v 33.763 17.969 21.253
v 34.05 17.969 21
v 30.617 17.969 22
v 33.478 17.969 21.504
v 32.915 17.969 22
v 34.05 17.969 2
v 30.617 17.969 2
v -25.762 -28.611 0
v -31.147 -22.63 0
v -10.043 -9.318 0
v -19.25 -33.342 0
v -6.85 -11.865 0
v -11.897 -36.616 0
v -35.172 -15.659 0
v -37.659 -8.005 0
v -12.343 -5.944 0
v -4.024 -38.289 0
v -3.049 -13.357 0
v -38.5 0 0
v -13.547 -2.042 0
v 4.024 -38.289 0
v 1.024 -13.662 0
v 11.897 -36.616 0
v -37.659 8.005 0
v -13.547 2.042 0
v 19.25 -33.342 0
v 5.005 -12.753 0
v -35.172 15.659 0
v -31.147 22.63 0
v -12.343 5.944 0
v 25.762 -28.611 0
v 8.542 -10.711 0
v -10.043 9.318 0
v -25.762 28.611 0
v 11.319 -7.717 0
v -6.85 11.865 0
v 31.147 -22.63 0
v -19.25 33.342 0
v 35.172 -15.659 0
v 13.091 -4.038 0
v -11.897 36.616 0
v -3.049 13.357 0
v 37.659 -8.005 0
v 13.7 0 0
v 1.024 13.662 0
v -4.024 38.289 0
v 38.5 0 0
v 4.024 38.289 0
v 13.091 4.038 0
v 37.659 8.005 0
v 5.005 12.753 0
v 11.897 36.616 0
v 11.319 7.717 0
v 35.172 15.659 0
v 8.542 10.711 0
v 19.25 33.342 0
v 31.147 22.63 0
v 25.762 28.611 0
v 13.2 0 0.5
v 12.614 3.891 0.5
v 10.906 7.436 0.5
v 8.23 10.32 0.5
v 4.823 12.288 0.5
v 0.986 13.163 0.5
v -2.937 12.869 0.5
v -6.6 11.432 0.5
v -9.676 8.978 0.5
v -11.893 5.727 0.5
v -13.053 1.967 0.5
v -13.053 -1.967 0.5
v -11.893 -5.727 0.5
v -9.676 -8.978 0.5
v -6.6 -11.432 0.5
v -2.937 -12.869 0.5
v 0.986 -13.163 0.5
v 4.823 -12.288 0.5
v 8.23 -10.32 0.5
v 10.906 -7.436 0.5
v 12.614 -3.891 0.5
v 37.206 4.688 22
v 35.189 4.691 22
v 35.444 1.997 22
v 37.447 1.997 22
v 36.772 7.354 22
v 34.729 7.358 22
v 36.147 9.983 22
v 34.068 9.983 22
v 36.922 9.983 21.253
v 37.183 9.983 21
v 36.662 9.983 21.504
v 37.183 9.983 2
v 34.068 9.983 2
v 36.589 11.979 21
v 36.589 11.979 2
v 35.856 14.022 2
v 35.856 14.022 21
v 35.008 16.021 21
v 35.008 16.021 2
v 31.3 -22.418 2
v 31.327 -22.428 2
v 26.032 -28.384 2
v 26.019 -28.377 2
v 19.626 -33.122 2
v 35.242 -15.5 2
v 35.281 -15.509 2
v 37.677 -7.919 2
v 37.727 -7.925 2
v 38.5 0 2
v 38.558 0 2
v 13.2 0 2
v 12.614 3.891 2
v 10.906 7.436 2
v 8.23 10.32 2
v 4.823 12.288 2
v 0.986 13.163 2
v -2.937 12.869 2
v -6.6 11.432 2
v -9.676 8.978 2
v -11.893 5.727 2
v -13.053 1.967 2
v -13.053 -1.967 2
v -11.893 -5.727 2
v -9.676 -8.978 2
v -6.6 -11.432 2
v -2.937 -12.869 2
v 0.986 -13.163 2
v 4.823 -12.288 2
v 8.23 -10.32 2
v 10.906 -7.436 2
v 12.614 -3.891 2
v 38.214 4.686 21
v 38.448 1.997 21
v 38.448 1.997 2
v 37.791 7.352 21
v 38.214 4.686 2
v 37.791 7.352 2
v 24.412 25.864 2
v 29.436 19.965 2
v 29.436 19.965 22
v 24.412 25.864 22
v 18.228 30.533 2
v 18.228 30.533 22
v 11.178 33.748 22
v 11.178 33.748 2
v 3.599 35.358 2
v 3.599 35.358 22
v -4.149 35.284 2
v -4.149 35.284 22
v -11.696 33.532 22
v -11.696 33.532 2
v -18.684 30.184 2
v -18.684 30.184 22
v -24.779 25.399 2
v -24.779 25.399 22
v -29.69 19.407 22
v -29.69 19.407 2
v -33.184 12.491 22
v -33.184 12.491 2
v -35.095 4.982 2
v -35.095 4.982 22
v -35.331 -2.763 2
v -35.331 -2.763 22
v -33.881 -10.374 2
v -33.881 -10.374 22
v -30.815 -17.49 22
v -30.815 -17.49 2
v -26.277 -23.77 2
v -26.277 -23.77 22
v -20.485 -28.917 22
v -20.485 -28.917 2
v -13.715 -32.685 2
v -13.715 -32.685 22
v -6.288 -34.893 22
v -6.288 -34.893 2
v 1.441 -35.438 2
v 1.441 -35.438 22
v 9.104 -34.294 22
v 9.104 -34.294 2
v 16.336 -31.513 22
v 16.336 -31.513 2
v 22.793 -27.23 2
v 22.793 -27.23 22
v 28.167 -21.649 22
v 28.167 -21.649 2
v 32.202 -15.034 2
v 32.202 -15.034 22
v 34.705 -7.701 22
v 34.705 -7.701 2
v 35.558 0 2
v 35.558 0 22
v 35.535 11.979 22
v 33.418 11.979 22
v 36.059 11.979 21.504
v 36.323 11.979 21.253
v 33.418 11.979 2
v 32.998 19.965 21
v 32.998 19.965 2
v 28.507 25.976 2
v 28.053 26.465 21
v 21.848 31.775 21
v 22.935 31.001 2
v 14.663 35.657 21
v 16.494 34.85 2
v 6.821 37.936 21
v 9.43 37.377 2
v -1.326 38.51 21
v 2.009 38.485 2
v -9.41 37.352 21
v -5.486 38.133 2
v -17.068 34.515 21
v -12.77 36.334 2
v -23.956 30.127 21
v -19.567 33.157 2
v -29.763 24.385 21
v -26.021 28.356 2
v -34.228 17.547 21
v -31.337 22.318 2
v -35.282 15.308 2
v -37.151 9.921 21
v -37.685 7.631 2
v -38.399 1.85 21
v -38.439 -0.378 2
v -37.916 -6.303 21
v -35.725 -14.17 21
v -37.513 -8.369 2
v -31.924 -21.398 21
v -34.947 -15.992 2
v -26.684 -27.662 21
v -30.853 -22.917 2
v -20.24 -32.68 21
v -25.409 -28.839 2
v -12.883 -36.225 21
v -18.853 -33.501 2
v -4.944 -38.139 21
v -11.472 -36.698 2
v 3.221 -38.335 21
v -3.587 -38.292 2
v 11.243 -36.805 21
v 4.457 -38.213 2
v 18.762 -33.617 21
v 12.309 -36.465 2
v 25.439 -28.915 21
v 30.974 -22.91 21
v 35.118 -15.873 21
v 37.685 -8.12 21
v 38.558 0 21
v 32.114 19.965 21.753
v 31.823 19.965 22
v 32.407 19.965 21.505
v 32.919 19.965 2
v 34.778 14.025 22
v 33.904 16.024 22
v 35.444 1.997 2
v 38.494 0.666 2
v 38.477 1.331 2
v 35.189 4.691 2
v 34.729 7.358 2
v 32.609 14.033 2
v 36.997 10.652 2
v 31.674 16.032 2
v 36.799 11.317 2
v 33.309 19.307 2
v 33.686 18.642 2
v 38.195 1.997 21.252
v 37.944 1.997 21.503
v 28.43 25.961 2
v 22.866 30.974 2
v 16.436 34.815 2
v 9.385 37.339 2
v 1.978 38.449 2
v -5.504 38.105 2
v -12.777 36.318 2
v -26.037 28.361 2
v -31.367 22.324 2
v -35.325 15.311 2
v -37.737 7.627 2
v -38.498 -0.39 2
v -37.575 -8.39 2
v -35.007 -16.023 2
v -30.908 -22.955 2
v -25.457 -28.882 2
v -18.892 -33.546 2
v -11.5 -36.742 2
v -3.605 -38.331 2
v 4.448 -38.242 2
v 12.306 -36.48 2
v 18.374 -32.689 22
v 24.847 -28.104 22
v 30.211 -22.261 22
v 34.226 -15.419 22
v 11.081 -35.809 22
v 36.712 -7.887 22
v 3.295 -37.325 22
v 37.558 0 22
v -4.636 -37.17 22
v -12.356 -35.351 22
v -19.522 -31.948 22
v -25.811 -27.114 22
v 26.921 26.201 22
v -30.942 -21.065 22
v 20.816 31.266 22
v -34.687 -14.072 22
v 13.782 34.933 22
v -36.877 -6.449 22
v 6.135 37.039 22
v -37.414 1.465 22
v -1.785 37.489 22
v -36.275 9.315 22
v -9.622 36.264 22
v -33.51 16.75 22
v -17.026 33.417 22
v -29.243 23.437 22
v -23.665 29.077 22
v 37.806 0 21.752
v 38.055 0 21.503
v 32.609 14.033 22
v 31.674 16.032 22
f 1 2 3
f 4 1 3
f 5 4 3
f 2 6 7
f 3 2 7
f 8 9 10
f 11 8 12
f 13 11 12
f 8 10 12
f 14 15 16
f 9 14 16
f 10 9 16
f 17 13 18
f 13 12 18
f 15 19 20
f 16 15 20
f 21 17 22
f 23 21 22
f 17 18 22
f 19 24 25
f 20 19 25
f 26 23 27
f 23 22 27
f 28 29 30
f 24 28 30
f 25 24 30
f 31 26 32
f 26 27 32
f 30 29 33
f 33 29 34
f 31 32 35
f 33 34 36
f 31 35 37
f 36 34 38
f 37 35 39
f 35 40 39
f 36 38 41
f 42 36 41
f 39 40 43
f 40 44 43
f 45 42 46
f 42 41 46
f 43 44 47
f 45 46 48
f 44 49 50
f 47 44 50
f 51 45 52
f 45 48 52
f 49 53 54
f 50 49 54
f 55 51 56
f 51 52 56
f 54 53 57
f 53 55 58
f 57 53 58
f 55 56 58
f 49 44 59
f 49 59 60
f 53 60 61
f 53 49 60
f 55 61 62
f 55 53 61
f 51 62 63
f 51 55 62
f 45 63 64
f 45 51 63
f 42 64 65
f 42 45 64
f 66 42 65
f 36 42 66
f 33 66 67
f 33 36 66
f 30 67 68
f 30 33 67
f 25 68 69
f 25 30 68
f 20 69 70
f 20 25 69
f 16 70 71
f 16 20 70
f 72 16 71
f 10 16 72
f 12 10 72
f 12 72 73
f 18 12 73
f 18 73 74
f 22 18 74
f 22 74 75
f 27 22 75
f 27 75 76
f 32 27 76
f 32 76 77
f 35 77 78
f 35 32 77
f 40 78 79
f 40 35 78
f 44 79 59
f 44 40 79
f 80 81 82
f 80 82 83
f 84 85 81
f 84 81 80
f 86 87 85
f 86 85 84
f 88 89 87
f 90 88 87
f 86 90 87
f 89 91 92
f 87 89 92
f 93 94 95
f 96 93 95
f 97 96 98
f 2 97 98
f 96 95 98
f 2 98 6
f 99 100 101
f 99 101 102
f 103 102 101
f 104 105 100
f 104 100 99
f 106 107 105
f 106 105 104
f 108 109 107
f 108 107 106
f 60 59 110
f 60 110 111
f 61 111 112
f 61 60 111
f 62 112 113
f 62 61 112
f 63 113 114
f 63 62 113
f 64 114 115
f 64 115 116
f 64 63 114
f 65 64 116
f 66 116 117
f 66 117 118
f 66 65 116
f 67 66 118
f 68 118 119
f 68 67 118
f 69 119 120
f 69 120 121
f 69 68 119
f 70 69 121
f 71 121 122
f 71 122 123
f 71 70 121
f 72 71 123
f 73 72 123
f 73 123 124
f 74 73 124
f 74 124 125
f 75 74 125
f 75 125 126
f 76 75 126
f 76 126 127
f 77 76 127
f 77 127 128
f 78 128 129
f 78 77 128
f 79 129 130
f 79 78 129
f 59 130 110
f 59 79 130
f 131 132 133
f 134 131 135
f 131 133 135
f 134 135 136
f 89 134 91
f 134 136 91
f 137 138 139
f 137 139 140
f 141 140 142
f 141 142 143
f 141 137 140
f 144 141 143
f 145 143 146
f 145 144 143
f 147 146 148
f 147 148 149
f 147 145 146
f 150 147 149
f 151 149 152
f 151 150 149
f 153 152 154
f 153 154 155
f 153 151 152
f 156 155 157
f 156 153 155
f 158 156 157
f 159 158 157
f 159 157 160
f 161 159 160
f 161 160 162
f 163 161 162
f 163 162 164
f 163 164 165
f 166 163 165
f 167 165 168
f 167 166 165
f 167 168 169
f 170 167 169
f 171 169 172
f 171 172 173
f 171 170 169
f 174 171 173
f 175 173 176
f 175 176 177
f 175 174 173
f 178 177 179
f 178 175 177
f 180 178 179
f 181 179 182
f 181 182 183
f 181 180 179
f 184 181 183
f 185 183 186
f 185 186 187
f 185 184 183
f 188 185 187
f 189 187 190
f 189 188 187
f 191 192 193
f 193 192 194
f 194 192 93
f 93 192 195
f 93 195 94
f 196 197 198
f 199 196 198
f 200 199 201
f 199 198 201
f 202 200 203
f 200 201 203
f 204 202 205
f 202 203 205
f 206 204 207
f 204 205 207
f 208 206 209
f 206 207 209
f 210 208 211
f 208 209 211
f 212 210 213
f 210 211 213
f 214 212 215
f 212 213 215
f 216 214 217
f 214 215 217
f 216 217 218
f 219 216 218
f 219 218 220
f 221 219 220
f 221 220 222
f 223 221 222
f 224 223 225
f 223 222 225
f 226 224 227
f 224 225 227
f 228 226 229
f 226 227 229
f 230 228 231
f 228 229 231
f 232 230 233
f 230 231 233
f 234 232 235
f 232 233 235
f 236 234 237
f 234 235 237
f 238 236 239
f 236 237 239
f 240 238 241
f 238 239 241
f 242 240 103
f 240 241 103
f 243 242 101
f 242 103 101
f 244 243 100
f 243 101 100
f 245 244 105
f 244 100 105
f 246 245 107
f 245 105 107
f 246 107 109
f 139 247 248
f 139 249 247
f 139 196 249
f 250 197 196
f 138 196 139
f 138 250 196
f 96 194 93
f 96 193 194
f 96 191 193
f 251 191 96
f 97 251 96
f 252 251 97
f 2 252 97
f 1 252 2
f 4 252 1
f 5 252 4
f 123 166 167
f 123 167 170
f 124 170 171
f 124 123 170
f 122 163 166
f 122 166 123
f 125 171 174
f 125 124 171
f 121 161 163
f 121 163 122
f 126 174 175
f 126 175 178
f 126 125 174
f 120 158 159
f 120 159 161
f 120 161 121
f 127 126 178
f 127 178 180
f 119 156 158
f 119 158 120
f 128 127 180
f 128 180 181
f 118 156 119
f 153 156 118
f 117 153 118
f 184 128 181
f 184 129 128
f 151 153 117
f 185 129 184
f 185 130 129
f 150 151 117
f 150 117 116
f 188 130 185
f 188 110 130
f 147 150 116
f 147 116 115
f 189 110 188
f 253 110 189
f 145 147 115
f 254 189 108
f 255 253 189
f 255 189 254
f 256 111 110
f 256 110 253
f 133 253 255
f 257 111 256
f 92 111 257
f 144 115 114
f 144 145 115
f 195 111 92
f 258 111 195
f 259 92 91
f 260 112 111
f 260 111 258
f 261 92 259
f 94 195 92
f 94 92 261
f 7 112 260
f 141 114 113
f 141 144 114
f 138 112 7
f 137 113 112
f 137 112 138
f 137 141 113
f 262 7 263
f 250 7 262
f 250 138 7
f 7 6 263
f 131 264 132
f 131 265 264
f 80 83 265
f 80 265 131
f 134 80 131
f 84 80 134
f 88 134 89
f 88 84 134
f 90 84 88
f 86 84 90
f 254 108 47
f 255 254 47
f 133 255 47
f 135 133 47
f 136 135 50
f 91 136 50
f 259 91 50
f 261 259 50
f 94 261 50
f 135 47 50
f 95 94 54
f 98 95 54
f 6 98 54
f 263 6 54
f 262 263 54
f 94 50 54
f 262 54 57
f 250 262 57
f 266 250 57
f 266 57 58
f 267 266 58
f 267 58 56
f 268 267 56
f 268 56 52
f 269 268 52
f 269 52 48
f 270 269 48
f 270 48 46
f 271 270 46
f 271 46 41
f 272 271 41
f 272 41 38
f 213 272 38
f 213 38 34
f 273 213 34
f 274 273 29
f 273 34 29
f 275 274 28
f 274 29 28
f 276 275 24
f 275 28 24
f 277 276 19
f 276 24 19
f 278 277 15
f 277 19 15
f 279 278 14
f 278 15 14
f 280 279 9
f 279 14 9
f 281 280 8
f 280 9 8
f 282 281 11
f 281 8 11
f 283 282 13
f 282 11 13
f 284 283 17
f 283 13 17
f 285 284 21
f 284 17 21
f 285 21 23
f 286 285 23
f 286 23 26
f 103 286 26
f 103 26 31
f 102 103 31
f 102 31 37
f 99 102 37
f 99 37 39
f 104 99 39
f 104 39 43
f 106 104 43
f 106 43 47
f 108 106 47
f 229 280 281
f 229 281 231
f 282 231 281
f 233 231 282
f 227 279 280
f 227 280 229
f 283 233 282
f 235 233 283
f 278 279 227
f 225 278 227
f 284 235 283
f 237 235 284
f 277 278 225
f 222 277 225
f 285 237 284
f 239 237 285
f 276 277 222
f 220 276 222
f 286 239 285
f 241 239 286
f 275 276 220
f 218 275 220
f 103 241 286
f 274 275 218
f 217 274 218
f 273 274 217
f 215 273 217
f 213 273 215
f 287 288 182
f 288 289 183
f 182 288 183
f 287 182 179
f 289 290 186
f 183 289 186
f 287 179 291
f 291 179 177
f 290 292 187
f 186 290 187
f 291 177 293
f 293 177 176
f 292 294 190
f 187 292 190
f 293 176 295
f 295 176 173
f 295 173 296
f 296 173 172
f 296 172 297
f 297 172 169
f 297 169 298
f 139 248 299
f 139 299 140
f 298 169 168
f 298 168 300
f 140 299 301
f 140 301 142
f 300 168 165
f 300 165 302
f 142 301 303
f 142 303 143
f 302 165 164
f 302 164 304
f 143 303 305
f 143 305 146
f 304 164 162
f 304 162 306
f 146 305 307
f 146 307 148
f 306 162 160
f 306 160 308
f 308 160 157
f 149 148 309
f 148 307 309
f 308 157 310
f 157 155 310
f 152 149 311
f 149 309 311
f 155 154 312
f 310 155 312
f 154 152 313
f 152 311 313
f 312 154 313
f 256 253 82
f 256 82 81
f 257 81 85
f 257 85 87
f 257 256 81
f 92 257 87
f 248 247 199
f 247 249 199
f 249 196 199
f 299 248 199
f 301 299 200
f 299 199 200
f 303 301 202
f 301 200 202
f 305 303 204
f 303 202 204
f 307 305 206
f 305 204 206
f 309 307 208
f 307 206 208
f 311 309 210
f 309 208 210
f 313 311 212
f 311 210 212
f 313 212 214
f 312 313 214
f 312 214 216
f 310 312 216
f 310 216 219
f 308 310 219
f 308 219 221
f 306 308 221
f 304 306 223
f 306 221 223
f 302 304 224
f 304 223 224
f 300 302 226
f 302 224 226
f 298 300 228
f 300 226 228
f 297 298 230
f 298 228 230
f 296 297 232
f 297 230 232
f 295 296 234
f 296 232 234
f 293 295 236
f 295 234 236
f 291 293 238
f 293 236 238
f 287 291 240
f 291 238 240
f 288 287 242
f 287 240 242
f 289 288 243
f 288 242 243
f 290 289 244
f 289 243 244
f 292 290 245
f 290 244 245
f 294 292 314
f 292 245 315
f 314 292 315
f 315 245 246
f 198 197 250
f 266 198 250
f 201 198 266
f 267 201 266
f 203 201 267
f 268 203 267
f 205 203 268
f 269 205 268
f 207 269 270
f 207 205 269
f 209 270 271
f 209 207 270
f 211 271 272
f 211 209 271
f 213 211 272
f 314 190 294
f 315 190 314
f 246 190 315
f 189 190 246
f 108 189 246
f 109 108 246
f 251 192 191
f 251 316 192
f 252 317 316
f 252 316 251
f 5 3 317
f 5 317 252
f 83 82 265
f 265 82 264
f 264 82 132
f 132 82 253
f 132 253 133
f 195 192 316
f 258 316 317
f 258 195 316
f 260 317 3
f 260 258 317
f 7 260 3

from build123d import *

# Parameters (mm, degrees)
SKETCH_R        = 38.5
SKETCH_R_2      = 13.2
PAD_DEPTH       = 2
PAD001_DEPTH    = 20
PAD002_DEPTH    = 20
PAD003_DEPTH    = 20
CHAMFER_SIZE    = 1
CHAMFER001_SIZE = 1
CHAMFER002_SIZE = 1
CHAMFER003_SIZE = 0.5


with BuildPart() as part:
    # Sketch → Pad (new body)
    with BuildSketch(Plane.XY):
        Circle(SKETCH_R)
        Circle(SKETCH_R_2, mode=Mode.SUBTRACT)
    extrude(amount=PAD_DEPTH)

    # Sketch001 (on Face4 of Pad) → Pad001 (join)
    with BuildSketch(Plane.XY.offset(2)):
        with BuildLine():
            ThreePointArc((29.4355806661, 19.9653668161), (-33.881351172, -10.373953904), (35.5584664799, 5.03191e-05))
            Line((35.5584664799, 5.03191e-05), (38.5584677887, 5.03191e-05))
            ThreePointArc((32.9980317105, 19.9653668161), (-37.0299944858, -10.2947354738), (38.5584677887, 5.03191e-05))
            Line((32.9980317105, 19.9653668161), (29.4355806661, 19.9653668161))
        make_face()
    extrude(amount=PAD001_DEPTH)

    # Sketch002 (on Face4 of Pad001) → Pad002 (join)
    with BuildSketch(Plane.XY.offset(2)):
        with BuildLine():
            ThreePointArc((38.4481958149, 1.9965566804), (38.0259798013, 6.0228614586), (37.1833064686, 9.9825708144))
            Line((37.1833064686, 9.9825708144), (34.0675546515, 9.9825708144))
            ThreePointArc((35.4438113275, 1.9965566804), (34.9843051311, 6.02896297), (34.0675546515, 9.9825708144))
            Line((35.4438113275, 1.9965566804), (38.4481958149, 1.9965566804))
        make_face()
    extrude(amount=PAD002_DEPTH)

    # Sketch003 (on Face3 of Pad002) → Pad003 (join)
    with BuildSketch(Plane.XY.offset(2)):
        with BuildLine():
            Line((33.4177914057, 11.9791993709), (36.5889161145, 11.9791993709))
            ThreePointArc((36.5889161145, 11.9791993709), (35.4459881583, 15.0277051968), (34.0495834936, 17.9687468653))
            Line((34.0495834936, 17.9687468653), (30.6165663668, 17.9687468653))
            ThreePointArc((33.4177914057, 11.9791993709), (32.1569341454, 15.0393346386), (30.6165663668, 17.9687468653))
        make_face()
    extrude(amount=PAD003_DEPTH)

    # Chamfer
    chamfer_edges = [part.edges().sort_by_distance(p)[0] for p in [
        (-37.029994, -10.294735, 22),
    ]]
    chamfer(chamfer_edges, length=CHAMFER_SIZE)

    # Chamfer001
    chamfer001_edges = [part.edges().sort_by_distance(p)[0] for p in [
        (38.02598, 6.022861, 22),
    ]]
    chamfer(chamfer001_edges, length=CHAMFER001_SIZE)

    # Chamfer002
    chamfer002_edges = [part.edges().sort_by_distance(p)[0] for p in [
        (35.445988, 15.027705, 22),
    ]]
    chamfer(chamfer002_edges, length=CHAMFER002_SIZE)

    # Chamfer003
    chamfer003_edges = [part.edges().sort_by_distance(p)[0] for p in [
        (-13.2, 0, 0),
    ]]
    chamfer(chamfer003_edges, length=CHAMFER003_SIZE)


solid = part.part
